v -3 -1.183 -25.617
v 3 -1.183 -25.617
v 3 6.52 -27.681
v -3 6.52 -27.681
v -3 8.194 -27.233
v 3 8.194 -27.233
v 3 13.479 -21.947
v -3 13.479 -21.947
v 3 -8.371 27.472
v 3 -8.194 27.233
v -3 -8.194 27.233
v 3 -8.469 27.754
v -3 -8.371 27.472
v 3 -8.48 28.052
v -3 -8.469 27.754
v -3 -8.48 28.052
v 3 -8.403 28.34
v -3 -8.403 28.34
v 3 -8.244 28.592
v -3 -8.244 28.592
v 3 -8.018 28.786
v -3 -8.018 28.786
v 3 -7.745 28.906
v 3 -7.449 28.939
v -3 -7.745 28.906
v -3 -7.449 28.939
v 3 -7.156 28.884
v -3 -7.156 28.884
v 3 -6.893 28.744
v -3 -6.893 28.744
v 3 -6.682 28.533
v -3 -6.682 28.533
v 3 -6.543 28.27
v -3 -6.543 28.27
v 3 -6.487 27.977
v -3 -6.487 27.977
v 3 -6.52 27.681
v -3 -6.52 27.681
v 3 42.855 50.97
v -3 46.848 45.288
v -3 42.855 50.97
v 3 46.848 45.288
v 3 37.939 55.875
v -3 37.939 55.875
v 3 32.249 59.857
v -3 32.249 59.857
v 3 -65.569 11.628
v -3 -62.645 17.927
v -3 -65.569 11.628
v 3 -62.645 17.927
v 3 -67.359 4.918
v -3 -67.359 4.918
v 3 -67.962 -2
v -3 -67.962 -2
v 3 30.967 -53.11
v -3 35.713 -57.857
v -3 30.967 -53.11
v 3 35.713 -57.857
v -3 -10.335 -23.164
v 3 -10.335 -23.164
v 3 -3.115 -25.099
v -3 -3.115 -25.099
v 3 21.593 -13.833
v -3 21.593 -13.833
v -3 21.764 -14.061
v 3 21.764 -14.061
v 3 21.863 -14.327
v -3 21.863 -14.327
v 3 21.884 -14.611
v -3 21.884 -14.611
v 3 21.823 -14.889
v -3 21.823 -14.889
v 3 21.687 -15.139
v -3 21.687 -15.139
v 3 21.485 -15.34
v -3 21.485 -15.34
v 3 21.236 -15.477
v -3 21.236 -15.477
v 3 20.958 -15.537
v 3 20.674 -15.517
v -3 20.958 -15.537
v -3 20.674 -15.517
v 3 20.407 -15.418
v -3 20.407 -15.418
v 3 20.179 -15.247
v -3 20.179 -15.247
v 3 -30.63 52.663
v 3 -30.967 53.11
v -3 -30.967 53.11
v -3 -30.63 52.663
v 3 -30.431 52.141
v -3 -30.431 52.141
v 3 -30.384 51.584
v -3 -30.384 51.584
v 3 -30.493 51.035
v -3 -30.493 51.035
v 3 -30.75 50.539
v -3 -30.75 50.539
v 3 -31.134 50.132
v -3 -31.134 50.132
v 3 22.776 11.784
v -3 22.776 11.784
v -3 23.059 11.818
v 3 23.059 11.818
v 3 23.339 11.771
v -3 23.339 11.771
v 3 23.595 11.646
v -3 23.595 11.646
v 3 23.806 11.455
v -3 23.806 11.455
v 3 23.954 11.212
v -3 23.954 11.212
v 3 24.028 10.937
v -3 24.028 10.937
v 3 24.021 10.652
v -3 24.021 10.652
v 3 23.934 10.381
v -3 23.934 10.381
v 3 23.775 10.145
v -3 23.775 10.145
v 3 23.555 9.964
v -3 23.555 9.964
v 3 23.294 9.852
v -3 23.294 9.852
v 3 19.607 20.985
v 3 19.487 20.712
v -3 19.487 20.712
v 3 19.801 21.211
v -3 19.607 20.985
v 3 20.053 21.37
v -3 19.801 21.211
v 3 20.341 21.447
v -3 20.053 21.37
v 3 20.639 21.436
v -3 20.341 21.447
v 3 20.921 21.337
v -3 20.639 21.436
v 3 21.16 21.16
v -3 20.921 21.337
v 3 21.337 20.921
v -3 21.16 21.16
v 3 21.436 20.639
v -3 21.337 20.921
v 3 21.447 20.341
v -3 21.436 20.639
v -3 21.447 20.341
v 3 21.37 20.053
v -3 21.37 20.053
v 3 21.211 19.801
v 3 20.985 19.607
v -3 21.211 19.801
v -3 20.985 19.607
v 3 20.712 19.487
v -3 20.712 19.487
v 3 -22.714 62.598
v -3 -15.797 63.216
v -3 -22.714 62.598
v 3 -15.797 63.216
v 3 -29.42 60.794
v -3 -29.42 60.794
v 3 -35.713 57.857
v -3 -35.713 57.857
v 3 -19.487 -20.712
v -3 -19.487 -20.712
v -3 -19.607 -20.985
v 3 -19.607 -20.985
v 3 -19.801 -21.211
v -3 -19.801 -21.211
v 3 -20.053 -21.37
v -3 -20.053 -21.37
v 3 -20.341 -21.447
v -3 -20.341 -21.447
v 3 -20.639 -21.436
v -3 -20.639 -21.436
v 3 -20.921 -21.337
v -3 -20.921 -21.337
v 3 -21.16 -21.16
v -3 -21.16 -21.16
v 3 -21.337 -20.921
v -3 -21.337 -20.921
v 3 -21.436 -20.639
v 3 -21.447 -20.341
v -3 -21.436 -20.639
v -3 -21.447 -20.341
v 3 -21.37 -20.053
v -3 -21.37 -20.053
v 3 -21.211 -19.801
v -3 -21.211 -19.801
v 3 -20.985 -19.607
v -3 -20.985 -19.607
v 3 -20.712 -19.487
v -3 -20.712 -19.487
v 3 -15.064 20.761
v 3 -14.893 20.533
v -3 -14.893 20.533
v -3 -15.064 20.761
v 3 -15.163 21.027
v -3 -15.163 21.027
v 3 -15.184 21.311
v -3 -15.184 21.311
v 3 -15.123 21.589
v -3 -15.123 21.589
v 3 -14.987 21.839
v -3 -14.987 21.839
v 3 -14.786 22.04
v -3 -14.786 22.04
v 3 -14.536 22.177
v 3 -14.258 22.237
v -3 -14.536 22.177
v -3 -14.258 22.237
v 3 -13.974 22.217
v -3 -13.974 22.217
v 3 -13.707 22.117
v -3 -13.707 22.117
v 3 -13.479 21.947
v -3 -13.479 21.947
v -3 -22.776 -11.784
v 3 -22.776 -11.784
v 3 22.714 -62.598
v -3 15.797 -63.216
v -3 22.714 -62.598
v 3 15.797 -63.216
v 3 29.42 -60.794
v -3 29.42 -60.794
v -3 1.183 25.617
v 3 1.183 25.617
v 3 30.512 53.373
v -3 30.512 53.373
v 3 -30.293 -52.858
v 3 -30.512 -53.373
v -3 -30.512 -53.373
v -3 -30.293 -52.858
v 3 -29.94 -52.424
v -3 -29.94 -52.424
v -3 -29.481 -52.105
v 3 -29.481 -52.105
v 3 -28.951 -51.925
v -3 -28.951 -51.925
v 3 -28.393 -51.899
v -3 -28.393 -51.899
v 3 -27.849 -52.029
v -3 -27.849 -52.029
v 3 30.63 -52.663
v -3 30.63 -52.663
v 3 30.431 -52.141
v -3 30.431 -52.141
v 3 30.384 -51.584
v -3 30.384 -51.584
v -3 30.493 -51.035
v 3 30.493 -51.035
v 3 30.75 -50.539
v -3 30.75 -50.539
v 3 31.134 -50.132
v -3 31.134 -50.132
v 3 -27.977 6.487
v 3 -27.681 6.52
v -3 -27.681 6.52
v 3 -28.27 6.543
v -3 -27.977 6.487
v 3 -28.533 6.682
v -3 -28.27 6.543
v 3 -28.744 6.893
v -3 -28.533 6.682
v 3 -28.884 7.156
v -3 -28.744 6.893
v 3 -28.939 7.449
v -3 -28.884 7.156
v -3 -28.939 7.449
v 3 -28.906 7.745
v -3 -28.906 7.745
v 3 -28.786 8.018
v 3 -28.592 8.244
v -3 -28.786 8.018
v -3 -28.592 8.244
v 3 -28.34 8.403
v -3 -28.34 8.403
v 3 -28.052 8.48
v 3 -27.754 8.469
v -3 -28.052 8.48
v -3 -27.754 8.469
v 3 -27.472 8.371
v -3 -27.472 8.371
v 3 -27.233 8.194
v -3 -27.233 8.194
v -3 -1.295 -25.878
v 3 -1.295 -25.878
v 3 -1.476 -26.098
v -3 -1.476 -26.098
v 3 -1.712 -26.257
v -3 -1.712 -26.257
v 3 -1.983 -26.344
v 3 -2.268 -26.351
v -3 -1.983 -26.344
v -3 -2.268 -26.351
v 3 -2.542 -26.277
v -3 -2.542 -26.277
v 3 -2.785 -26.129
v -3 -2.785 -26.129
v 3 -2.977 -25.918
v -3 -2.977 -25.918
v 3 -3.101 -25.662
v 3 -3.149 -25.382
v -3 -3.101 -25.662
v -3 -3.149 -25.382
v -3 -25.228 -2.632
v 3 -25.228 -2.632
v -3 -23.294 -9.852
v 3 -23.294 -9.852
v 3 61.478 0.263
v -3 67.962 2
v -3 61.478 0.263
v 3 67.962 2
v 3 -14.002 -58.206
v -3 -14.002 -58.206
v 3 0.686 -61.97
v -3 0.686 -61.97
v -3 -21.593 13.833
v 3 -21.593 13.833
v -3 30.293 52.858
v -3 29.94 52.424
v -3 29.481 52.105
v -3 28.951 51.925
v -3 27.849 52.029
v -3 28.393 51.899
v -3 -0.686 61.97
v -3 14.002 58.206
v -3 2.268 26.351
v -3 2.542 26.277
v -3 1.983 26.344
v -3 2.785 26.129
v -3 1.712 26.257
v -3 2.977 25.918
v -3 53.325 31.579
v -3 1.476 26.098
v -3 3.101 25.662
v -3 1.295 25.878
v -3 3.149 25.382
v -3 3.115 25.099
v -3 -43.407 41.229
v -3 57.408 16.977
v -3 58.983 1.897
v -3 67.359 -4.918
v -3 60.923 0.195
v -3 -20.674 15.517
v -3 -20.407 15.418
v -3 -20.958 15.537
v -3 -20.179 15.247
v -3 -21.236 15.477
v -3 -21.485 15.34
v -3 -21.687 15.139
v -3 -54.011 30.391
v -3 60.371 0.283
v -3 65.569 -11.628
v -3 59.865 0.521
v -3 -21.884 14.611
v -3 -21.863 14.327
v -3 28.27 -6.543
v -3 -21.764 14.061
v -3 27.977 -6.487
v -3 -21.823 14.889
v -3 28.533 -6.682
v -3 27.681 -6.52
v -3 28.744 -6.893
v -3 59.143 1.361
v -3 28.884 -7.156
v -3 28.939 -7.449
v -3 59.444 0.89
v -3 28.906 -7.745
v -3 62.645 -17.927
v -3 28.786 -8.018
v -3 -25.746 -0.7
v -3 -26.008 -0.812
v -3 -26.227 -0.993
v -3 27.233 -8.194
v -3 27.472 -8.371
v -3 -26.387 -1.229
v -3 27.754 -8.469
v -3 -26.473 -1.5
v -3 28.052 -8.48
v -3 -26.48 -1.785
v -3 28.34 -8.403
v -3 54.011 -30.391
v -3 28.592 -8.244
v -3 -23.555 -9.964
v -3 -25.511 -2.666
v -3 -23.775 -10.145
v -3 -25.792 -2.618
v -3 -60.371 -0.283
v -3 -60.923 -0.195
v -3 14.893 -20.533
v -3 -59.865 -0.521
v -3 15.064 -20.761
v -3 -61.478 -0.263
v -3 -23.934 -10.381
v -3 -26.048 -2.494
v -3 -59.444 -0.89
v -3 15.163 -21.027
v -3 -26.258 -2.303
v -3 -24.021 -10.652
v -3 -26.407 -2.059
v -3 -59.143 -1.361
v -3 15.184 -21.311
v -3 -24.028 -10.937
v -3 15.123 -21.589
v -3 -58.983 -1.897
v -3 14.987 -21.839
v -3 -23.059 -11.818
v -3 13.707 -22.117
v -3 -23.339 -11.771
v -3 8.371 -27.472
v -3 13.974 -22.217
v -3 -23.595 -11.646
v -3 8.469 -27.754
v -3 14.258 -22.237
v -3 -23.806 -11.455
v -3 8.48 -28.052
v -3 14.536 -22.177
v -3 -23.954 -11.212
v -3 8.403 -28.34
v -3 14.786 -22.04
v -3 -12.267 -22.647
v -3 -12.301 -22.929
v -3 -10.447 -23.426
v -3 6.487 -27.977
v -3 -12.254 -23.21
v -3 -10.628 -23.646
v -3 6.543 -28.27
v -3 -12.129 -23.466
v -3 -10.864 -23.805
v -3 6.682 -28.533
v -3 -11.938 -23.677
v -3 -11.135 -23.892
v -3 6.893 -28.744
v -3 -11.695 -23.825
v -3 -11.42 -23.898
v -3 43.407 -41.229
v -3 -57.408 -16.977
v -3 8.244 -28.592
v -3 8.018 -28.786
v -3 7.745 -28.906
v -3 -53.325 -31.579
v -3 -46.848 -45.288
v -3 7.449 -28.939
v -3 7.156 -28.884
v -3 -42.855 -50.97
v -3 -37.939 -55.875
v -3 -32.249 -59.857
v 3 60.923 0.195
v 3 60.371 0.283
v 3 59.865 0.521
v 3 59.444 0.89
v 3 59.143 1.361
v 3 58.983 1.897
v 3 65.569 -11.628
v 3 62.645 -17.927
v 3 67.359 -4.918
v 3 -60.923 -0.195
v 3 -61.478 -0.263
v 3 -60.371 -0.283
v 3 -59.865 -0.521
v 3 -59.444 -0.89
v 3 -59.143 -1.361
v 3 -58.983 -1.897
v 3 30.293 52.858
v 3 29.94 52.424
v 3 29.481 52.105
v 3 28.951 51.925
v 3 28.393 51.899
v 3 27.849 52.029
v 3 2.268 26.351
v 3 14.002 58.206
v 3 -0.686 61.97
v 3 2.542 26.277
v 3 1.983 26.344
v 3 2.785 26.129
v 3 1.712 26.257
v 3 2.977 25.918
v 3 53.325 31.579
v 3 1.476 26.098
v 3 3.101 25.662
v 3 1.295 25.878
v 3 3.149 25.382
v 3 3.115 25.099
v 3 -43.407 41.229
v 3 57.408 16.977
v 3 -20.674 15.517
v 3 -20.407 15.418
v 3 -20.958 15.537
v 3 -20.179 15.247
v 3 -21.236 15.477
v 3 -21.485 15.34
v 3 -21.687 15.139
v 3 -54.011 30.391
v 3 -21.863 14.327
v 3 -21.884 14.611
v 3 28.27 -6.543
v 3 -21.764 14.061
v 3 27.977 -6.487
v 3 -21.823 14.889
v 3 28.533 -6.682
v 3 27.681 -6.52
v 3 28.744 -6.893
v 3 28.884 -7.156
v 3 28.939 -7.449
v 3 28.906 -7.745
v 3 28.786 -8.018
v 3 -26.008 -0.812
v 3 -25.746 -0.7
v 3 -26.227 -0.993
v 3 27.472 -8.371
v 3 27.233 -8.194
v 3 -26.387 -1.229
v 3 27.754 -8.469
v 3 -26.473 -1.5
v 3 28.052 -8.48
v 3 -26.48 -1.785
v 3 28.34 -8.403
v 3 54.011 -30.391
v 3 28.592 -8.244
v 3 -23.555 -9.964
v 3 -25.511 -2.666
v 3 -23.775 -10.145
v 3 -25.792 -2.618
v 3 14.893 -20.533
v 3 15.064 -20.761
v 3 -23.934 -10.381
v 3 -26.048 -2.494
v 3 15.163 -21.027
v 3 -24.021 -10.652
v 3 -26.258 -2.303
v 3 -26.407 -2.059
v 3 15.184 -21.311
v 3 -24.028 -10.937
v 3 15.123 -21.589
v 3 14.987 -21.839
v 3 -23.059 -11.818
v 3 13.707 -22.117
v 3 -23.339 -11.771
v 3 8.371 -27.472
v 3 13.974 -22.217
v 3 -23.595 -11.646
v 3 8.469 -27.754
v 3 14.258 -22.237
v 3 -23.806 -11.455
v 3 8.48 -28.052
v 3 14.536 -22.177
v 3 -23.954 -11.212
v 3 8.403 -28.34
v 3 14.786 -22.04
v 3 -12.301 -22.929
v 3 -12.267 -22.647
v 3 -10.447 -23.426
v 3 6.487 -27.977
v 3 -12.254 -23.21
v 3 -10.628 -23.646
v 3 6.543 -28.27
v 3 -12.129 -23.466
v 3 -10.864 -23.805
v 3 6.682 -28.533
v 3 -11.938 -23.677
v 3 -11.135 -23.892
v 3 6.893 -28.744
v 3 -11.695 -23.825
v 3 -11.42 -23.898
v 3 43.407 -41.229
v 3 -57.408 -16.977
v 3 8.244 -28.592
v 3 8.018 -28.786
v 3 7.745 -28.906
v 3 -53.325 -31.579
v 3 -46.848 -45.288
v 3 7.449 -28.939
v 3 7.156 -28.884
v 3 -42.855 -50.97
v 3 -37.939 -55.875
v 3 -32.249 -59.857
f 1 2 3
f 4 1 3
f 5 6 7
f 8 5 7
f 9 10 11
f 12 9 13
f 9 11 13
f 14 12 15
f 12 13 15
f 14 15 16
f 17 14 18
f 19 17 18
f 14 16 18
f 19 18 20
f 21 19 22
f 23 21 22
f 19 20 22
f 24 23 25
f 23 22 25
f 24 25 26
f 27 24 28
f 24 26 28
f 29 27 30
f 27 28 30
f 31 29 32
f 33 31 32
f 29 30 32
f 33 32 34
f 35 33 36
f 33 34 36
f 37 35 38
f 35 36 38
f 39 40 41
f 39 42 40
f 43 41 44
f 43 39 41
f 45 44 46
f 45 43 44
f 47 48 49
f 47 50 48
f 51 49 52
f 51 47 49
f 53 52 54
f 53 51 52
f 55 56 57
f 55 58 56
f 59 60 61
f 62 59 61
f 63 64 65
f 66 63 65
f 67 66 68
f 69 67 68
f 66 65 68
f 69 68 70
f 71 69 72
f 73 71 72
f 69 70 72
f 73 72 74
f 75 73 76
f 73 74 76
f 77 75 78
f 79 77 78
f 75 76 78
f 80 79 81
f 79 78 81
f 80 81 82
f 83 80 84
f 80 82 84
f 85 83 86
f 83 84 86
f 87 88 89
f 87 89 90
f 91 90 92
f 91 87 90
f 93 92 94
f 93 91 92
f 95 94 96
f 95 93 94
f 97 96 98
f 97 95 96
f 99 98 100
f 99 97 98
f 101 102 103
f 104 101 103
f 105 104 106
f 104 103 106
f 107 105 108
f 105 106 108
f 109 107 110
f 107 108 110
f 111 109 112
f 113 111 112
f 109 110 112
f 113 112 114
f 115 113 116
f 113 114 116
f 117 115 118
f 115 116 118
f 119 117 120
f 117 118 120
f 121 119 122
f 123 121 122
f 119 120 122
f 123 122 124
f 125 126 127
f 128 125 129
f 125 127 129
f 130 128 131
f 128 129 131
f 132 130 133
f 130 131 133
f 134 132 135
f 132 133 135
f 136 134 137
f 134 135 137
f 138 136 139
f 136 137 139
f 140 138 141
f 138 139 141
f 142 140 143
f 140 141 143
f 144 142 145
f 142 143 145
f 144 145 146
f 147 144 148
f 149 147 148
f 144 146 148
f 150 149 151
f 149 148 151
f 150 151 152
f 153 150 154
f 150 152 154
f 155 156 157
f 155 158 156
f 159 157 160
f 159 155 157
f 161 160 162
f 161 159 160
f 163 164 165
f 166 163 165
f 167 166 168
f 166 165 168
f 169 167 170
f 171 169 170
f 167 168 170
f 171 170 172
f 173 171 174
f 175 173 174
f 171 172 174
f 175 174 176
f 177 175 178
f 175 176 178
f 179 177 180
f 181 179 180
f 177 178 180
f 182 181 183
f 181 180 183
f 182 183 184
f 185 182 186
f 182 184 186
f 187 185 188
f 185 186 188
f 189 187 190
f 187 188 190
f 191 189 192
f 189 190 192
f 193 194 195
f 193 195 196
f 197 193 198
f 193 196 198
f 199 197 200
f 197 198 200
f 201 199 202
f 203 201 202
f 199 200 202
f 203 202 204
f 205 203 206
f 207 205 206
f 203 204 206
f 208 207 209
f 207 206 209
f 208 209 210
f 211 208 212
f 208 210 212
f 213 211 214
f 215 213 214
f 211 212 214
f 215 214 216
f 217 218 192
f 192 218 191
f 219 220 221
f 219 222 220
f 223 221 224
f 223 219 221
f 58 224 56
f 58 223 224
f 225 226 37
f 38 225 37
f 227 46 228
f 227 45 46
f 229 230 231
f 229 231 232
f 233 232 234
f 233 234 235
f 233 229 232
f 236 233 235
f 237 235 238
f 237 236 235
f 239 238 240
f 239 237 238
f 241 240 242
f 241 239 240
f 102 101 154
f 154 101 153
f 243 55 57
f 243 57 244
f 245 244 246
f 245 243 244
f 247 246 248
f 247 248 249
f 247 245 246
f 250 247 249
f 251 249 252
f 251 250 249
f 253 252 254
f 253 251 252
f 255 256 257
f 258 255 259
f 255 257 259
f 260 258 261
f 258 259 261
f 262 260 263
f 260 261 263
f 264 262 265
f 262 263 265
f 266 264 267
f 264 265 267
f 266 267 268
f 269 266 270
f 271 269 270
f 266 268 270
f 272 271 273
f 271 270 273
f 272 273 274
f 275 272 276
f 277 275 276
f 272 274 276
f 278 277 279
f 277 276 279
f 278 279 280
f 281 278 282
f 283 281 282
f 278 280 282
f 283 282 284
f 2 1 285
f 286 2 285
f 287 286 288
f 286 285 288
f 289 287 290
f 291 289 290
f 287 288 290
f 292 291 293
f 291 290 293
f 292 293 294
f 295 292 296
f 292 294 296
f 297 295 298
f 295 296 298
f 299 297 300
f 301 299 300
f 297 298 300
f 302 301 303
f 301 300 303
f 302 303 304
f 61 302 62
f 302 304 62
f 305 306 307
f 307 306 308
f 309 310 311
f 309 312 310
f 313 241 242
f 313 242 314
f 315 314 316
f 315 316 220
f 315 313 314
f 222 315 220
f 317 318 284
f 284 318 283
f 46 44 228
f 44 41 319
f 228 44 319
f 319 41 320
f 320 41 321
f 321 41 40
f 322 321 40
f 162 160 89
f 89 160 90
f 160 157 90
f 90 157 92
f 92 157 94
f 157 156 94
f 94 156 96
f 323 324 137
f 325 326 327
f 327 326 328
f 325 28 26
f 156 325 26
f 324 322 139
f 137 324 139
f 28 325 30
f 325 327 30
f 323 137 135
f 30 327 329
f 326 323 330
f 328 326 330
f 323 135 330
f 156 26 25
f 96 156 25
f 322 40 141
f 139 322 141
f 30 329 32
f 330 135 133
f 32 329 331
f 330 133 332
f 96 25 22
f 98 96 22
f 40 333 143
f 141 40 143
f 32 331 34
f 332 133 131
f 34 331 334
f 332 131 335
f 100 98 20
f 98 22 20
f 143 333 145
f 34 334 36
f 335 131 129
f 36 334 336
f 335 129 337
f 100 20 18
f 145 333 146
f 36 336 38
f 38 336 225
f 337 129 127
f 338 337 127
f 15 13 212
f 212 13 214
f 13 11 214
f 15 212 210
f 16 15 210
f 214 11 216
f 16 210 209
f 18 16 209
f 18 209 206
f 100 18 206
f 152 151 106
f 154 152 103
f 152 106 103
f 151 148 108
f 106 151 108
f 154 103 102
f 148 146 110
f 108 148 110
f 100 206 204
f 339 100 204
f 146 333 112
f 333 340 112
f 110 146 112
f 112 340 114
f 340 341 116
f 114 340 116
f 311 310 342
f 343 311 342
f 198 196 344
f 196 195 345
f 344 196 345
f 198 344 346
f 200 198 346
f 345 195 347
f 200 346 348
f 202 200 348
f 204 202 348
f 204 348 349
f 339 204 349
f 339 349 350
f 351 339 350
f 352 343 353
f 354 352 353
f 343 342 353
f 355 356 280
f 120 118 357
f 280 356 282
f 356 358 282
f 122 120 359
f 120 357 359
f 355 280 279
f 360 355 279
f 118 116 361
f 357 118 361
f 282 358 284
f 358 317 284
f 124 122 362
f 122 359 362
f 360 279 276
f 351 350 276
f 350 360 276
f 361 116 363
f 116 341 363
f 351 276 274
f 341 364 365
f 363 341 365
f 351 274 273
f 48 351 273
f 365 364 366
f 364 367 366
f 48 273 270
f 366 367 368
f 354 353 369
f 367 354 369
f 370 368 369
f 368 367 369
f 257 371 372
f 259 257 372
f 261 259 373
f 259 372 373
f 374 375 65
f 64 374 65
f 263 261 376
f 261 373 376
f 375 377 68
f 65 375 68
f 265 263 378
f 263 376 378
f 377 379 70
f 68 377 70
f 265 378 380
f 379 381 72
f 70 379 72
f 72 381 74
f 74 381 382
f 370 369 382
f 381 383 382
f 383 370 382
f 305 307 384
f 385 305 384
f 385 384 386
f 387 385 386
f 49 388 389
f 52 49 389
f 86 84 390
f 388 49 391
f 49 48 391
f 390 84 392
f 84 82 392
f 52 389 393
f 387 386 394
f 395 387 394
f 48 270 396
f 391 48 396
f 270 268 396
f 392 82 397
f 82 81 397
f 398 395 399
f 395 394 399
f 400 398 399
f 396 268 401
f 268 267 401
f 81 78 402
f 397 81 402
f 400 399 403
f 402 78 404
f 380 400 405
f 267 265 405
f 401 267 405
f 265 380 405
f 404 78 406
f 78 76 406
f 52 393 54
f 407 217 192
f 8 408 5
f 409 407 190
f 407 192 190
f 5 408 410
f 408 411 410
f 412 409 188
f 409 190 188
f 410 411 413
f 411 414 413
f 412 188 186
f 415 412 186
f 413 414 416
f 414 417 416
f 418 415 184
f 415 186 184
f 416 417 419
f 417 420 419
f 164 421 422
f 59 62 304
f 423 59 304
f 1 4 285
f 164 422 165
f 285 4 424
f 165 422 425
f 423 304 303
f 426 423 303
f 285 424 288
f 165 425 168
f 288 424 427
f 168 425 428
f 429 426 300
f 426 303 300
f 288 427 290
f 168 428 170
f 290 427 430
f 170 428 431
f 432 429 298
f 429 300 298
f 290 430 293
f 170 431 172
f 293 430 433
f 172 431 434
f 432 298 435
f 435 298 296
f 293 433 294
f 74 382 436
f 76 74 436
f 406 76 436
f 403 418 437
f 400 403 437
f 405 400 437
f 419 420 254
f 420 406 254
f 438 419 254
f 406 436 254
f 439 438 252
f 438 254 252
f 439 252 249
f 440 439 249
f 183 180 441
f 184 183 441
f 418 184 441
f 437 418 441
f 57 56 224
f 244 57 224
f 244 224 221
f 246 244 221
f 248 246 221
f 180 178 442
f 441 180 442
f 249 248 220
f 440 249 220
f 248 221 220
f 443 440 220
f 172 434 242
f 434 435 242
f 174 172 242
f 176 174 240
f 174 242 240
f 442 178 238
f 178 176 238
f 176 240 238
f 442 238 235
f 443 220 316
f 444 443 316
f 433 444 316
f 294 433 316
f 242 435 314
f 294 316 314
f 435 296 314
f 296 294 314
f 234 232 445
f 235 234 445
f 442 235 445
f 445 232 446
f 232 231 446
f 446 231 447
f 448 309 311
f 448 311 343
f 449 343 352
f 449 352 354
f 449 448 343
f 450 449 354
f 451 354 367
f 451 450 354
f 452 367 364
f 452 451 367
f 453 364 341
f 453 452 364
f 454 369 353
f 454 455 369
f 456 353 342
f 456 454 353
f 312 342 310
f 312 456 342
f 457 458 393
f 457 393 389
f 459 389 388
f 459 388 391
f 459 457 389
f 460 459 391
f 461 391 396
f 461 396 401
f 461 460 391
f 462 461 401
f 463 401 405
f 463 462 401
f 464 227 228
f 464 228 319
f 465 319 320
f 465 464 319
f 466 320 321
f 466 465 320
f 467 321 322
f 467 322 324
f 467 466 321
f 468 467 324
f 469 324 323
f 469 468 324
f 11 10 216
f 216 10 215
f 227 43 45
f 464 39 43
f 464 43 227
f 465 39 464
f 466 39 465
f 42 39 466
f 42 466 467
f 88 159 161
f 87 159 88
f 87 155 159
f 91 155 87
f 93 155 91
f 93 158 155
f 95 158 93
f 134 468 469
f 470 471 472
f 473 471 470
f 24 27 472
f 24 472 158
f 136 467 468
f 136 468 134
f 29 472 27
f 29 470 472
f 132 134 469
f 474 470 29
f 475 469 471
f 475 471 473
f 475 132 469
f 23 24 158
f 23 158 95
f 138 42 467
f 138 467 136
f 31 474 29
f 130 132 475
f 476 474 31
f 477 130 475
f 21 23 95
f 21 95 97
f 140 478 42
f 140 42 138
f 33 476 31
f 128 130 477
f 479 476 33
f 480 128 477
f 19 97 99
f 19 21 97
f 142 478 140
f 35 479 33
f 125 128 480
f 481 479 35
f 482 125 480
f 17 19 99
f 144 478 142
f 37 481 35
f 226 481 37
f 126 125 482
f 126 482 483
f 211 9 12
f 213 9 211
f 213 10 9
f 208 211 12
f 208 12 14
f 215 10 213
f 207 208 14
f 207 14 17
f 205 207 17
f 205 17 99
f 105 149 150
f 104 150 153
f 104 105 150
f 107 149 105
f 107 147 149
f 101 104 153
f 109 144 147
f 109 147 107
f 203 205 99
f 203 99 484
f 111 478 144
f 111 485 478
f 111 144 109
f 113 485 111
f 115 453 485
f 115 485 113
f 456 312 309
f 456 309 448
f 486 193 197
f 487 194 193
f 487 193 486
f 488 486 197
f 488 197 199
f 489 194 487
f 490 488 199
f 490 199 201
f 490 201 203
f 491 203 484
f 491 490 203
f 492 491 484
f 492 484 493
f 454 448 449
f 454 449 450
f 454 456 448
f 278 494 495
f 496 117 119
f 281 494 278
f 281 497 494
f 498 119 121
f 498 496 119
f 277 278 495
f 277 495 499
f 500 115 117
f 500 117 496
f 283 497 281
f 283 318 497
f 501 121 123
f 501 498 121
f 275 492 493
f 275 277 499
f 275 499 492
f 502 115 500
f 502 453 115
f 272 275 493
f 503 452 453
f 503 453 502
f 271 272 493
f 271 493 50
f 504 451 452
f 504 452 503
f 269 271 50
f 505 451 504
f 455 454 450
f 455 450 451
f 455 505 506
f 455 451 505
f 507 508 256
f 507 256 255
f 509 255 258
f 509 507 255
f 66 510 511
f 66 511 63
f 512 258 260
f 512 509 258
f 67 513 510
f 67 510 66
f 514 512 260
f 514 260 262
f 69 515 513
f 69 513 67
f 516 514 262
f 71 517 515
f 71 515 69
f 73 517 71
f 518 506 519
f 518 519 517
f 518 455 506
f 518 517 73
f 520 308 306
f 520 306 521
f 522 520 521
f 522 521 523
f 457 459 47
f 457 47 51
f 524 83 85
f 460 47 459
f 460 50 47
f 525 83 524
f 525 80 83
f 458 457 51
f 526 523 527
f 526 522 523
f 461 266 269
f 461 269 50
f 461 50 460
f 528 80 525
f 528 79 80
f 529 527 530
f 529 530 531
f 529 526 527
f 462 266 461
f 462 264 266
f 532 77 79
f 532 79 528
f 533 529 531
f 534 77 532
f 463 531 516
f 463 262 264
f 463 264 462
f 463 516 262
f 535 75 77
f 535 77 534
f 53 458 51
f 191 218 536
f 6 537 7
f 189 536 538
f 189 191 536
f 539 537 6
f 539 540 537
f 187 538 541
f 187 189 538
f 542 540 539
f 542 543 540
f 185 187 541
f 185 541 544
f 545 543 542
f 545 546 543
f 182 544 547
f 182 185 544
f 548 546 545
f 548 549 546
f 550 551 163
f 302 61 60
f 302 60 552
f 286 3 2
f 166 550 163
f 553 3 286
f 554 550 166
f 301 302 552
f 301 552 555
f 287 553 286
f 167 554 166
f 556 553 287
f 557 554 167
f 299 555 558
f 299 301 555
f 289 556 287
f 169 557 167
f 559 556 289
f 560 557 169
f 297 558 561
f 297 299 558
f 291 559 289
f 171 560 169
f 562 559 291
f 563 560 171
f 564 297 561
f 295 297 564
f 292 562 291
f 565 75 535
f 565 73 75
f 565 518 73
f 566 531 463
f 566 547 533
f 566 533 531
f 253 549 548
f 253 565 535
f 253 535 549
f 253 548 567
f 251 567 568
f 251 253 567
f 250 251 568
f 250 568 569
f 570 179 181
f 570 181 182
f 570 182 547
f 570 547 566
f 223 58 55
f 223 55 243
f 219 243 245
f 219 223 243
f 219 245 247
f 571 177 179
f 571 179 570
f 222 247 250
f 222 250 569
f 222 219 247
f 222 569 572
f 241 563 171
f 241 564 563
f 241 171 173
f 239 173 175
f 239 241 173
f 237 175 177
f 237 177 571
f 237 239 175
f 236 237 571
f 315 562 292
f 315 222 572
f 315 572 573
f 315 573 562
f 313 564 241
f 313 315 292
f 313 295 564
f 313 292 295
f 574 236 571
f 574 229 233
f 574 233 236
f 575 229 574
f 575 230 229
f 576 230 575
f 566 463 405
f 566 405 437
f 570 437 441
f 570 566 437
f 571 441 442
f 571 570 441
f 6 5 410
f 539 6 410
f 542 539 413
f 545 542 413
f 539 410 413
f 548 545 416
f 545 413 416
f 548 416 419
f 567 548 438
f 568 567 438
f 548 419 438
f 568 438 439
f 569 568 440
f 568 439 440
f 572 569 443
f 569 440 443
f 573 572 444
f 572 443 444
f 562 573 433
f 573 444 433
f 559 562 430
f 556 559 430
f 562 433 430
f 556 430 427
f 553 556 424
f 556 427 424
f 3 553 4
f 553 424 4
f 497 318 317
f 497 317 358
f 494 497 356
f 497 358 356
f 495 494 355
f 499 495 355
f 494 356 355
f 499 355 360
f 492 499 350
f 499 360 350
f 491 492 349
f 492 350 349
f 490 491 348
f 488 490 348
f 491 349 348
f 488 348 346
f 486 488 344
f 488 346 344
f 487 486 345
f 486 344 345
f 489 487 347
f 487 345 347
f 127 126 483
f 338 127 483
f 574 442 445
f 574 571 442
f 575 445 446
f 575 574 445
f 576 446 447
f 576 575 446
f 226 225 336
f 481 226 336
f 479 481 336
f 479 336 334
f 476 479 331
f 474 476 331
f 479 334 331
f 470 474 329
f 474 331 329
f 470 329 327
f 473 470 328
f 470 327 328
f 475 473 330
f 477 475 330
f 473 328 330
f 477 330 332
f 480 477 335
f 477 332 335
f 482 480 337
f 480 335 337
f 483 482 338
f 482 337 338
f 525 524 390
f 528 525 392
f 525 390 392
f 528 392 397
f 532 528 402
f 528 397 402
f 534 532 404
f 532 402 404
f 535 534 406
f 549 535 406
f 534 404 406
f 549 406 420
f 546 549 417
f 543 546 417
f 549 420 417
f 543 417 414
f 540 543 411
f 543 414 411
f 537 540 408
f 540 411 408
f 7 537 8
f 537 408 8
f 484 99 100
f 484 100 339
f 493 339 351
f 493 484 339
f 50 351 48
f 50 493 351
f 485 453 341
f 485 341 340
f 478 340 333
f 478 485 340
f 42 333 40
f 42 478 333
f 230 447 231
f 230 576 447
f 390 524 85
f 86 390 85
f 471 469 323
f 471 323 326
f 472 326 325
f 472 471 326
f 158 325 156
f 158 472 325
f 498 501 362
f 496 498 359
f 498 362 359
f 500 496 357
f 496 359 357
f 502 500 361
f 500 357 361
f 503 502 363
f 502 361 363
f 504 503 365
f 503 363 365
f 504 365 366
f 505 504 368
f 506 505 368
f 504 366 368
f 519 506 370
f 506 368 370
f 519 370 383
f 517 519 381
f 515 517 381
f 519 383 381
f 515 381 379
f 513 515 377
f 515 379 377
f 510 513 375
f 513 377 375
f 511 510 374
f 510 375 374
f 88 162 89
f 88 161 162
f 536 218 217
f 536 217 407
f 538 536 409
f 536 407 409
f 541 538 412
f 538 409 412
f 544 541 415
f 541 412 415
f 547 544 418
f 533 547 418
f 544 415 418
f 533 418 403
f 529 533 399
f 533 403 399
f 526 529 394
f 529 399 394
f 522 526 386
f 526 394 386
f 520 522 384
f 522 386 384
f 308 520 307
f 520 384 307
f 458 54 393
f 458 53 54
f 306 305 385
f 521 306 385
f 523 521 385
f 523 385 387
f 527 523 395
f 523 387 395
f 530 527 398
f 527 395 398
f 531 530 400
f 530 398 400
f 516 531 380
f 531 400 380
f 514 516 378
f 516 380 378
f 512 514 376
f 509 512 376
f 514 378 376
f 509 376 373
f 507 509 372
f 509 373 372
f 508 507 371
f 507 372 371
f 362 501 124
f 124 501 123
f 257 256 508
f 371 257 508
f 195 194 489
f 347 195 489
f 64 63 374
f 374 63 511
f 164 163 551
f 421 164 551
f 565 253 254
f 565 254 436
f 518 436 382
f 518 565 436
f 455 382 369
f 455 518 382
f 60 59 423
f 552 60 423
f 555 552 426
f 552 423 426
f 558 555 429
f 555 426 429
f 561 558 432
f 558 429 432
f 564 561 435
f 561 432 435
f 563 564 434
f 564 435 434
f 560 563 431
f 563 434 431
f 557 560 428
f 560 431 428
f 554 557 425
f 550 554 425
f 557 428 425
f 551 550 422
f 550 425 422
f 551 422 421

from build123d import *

# Parameters (mm, degrees)
SKETCH1_R                = 59
EXTRUDE1_DEPTH           = 3
EXTRUDE2_DEPTH           = 3
CIRPATTERN1_COUNT        = 6
F_2_0_2_DIAMETER_HOLE1_D = 2
F_2_0_2_DIAMETER_HOLE3_D = 2
F_2_0_2_DIAMETER_HOLE4_D = 2
CIRPATTERN2_COUNT        = 6
CIRPATTERN3_COUNT        = 4
CIRPATTERN3_ANGLE        = 180


with BuildPart() as part:
    # Sketch1 → Extrude1 (new, symmetric)
    with BuildSketch(Plane(origin=(0, 0, 0), x_dir=(0, 0, -1), z_dir=(1, 0, 0))):
        Circle(SKETCH1_R)
        Polygon((27.939644545, 7.486405193), (7.486405193, 27.939644545), (-20.453239352, 20.453239352), (-27.939644545, -7.486405193), (-7.486405193, -27.939644545), (20.453239352, -20.453239352), align=None, mode=Mode.SUBTRACT)
    extrude(amount=EXTRUDE1_DEPTH, both=True)

    # Sketch2 → Extrude2 (add, symmetric)
    with BuildSketch(Plane(origin=(0, 0, 0), x_dir=(0, 0, -1), z_dir=(1, 0, 0))):
        with BuildLine():
            Line((-2, 67.961805723), (-0.262709442, 61.478149092))
            ThreePointArc((-0.262709442, 61.478149092), (-0.58620663, 59.77173183), (-2.122608272, 58.961805723))
            ThreePointArc((-2.122608272, 58.961805723), (28.679663449, 51.560419941), (51.21368579, 29.294340542))
            ThreePointArc((51.21368579, 29.294340542), (36.791707484, 48.186627241), (17.927108603, 62.644803614))
            ThreePointArc((17.927108603, 62.644803614), (8.312130826, 66.609702921), (-2, 67.961805723))
        make_face()
    extrude2 = extrude(amount=EXTRUDE2_DEPTH, both=True)

    # CirPattern1: Extrude2 ×6 about axis
    cirpattern1_axis = Axis((0, 0, 0), (1, 0, 0))
    for i in range(1, CIRPATTERN1_COUNT):
        add(extrude2.rotate(cirpattern1_axis, i * 360 / CIRPATTERN1_COUNT))

    # Ø2.0 (2) Diameter Hole1 (through all)
    with Locations(Plane(origin=(3, 0, 0), x_dir=(0, 0, -1), z_dir=(1, 0, 0))):
        with Locations((7.486405193, 27.939644545), (27.939644545, 7.486405193), (20.453239352, -20.453239352), (-7.486405193, -27.939644545), (-27.939644545, -7.486405193), (-20.453239352, 20.453239352)):
            Hole(F_2_0_2_DIAMETER_HOLE1_D / 2)

    # Ø2.0 (2) Diameter Hole3 (through all)
    with Locations(Plane(origin=(3, 0, 0), x_dir=(0, 0, -1), z_dir=(1, 0, 0))):
        with Locations((14.539853904, 20.886195834)):
            f_2_0_2_diameter_hole3 = Hole(F_2_0_2_DIAMETER_HOLE3_D / 2)

    # Ø2.0 (2) Diameter Hole4 (through all)
    with Locations(Plane(origin=(3, 0, 0), x_dir=(0, 0, -1), z_dir=(1, 0, 0))):
        with Locations((21.239749224, 14.186300513)):
            f_2_0_2_diameter_hole4 = Hole(F_2_0_2_DIAMETER_HOLE4_D / 2)

    # CirPattern2: Ø2.0 (2) Diameter Hole3 ×6 about axis
    cirpattern2_axis = Axis((0, 0, 0), (1, 0, 0))
    for i in range(1, CIRPATTERN2_COUNT):
        add(f_2_0_2_diameter_hole3.rotate(cirpattern2_axis, i * 360 / CIRPATTERN2_COUNT), mode=Mode.SUBTRACT)

    # CirPattern3: Ø2.0 (2) Diameter Hole4 ×4 about axis
    cirpattern3_axis = Axis((0, 0, 0), (-1, 0, 0))
    for i in range(1, CIRPATTERN3_COUNT):
        add(f_2_0_2_diameter_hole4.rotate(cirpattern3_axis, i * CIRPATTERN3_ANGLE / (CIRPATTERN3_COUNT - 1)), mode=Mode.SUBTRACT)


solid = part.part
